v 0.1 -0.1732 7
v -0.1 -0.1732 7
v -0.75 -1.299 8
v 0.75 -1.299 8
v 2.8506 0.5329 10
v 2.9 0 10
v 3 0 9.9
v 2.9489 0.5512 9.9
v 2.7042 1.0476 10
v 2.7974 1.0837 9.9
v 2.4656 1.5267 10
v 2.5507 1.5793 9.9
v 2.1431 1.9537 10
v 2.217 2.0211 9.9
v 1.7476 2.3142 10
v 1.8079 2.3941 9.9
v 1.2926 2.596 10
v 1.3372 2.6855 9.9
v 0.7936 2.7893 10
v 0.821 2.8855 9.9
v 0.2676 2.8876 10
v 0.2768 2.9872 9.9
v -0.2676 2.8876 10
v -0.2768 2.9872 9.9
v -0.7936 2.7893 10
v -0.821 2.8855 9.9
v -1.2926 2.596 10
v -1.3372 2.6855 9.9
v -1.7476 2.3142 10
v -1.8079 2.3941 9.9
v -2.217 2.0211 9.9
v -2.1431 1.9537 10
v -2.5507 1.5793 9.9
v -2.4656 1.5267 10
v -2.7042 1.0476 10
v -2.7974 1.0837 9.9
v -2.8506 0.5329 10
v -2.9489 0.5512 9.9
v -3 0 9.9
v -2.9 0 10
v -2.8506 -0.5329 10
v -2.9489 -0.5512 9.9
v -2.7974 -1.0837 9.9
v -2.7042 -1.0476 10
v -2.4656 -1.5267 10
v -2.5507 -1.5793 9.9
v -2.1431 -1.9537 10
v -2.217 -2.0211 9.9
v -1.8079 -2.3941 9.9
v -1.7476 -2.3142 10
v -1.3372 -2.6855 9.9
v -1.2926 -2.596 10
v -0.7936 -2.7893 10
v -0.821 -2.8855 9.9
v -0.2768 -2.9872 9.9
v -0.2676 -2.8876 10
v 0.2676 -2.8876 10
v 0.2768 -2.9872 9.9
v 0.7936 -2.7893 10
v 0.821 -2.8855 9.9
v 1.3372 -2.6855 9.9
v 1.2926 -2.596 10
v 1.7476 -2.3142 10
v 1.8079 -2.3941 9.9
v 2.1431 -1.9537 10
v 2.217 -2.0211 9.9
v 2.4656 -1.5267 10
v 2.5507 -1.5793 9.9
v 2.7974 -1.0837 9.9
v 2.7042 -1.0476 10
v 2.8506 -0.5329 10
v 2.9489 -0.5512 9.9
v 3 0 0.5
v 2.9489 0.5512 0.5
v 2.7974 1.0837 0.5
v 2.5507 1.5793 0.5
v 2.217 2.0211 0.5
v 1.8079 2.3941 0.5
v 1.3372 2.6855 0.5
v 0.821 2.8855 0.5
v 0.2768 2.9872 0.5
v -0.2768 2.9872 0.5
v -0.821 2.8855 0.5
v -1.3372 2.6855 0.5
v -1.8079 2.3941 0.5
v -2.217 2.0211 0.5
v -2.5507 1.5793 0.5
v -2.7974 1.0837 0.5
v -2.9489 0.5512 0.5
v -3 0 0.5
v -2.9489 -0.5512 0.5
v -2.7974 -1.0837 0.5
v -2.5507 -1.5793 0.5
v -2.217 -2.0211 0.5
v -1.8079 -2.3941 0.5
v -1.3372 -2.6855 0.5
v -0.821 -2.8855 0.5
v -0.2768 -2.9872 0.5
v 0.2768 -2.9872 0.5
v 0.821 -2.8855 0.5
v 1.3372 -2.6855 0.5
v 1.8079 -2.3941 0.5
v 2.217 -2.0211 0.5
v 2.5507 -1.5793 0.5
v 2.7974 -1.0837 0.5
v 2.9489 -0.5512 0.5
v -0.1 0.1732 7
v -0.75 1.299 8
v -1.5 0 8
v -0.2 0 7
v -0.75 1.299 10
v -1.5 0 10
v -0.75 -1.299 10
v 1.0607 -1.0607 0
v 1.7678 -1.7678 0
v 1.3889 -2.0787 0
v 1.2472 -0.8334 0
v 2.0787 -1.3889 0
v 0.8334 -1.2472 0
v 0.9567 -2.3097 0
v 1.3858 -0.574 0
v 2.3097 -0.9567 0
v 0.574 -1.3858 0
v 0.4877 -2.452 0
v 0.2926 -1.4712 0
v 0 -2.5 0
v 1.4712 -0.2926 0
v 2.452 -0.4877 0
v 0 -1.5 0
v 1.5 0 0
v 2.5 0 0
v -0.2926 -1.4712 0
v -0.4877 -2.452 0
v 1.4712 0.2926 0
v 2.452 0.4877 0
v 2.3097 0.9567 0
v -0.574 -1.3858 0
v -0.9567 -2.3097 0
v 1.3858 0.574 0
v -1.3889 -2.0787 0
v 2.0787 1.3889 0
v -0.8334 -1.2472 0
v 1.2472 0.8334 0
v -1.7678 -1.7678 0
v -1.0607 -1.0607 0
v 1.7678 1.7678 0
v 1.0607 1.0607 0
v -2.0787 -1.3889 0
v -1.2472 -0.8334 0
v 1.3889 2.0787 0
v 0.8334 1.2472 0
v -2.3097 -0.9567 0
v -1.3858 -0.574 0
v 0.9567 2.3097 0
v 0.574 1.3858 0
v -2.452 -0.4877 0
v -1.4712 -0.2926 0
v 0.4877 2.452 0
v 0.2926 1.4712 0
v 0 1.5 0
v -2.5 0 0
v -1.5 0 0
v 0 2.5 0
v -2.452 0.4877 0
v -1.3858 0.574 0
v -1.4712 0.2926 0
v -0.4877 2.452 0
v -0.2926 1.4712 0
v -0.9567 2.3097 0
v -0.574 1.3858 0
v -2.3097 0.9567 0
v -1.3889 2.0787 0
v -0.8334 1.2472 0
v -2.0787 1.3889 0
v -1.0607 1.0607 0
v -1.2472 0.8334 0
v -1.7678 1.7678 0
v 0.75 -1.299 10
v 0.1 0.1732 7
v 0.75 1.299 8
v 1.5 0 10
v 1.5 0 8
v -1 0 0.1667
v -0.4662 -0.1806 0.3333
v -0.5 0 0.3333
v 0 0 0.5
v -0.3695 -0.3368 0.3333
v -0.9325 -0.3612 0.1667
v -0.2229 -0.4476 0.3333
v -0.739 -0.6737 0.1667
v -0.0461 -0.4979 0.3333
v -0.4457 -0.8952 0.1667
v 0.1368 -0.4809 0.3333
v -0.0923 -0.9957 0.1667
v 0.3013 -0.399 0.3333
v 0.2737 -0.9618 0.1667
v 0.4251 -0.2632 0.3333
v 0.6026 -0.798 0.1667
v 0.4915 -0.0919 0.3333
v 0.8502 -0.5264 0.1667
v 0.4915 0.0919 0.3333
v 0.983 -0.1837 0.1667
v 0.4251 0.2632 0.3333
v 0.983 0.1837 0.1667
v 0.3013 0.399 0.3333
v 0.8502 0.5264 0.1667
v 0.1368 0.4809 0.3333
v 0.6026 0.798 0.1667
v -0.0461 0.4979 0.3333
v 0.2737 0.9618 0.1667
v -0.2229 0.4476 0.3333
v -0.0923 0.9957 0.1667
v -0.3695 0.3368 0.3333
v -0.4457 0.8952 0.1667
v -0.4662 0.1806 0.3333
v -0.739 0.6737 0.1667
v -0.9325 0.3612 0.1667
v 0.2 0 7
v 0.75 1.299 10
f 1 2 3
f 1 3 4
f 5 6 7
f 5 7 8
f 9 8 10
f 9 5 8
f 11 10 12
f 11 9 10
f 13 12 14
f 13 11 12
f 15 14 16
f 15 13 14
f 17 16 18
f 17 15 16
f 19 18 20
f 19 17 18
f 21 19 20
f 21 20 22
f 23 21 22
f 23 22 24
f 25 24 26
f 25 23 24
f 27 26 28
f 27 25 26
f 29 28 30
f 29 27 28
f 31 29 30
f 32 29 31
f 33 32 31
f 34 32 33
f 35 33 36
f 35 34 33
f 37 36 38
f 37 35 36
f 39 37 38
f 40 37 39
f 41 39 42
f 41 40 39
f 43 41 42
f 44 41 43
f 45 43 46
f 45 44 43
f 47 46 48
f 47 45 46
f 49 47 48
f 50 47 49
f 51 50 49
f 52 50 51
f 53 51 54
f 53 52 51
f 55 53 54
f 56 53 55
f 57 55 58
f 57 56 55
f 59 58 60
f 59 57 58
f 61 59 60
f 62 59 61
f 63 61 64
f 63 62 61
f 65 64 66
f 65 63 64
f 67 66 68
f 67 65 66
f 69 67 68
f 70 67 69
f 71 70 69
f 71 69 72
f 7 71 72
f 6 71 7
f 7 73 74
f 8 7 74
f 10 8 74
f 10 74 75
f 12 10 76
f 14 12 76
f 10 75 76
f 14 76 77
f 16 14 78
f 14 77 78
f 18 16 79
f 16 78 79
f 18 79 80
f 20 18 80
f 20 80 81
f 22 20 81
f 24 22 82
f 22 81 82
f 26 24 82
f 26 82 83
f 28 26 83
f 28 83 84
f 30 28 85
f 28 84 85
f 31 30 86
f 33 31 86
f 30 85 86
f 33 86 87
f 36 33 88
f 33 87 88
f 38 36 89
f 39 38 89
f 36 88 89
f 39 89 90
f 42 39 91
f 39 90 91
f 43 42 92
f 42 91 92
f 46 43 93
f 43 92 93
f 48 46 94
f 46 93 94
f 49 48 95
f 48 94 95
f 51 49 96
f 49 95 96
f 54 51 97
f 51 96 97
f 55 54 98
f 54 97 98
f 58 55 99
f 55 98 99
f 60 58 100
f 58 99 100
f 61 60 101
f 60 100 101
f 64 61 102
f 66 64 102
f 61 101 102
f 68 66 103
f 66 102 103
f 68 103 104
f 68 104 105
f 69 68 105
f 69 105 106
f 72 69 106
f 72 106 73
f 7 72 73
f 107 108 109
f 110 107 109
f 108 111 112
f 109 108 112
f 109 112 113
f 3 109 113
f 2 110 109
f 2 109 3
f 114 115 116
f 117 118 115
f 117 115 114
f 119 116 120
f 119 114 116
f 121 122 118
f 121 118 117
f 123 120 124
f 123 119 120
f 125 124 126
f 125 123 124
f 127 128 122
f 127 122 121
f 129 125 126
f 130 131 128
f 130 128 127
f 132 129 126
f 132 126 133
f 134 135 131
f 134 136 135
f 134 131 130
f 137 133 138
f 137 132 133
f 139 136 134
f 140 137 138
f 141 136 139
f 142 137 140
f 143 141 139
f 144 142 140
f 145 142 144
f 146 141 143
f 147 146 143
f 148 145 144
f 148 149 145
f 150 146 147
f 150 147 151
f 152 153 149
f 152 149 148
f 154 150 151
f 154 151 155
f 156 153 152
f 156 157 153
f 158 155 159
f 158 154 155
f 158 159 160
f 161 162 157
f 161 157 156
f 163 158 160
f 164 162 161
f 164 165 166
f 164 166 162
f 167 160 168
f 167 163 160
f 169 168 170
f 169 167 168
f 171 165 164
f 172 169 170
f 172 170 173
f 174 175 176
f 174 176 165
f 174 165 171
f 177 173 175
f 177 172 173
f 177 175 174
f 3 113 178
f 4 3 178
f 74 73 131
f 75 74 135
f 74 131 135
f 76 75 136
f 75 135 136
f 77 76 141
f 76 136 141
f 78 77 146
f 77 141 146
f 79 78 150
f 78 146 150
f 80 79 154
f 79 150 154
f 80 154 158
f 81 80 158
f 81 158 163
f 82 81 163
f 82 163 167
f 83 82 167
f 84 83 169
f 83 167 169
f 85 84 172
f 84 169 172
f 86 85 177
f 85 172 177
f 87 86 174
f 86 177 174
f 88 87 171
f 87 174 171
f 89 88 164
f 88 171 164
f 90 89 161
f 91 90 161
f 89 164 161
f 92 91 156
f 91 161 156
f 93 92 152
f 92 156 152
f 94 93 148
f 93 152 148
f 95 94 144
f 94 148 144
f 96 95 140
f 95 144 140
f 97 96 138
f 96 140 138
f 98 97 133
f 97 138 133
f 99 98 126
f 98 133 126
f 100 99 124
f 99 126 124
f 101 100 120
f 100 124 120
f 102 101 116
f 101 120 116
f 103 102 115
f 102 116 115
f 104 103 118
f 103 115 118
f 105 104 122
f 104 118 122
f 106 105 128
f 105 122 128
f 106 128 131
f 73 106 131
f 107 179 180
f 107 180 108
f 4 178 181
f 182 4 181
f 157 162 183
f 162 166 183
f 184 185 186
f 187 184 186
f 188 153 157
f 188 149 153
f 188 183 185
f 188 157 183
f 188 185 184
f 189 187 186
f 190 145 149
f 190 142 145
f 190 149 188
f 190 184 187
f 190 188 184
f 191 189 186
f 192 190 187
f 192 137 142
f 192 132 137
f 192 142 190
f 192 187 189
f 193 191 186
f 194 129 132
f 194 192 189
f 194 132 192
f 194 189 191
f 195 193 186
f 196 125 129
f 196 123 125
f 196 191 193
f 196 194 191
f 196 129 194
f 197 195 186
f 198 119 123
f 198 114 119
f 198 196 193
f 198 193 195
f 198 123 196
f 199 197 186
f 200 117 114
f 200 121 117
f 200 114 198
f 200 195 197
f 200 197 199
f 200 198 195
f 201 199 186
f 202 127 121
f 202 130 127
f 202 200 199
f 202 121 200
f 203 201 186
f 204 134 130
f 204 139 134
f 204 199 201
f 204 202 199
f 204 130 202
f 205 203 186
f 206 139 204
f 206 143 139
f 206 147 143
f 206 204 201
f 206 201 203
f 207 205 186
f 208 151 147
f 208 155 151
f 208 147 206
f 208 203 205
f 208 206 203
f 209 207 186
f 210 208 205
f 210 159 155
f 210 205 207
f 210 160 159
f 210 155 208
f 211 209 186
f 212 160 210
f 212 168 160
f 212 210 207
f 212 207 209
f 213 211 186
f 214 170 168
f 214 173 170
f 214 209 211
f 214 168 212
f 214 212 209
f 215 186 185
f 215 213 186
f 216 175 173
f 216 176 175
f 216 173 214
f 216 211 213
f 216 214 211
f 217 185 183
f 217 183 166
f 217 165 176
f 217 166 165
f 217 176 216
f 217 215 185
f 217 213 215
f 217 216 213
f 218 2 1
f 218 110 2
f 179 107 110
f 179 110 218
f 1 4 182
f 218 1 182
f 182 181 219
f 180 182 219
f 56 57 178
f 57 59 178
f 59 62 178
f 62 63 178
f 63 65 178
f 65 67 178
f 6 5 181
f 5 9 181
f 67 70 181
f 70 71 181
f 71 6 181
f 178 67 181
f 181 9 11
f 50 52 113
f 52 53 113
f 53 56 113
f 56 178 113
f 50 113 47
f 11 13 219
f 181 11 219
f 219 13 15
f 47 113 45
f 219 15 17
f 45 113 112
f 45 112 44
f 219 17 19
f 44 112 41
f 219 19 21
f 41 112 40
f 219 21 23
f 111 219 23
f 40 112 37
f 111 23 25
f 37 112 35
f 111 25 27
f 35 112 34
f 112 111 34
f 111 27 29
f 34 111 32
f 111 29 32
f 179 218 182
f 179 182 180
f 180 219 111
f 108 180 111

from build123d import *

# Parameters (mm, degrees)
SKETCH_1_W          = 3
SKETCH_1_H          = 10
CUT_EXTRUDE_1_DEPTH = 3
CHAMFER_1_SIZE      = 0.100000121
CHAMFER_1_SIZE2     = 0.100000075
CHAMFER_2_SIZE      = 1.125833025
CHAMFER_2_SIZE2     = 1
CHAMFER_3_SIZE      = 0.500000325
CHAMFER_3_SIZE2     = 0.500000243


with BuildPart() as part:
    # 草图1 → 旋转1 (revolve)
    with BuildSketch(Plane(origin=(0, 0, 0), x_dir=(1, 0, 0), z_dir=(0, 1, 0))):
        with Locations((1.5, -5)):
            Rectangle(SKETCH_1_W, SKETCH_1_H)
    revolve(axis=Axis((0, 0, 0), (0, 0, 1)))

    # 草图2 → 切除-拉伸1 (cut)
    with BuildSketch(Plane.XY.offset(10)):
        Polygon((0.75, -1.299038106), (1.5, 0), (0.75, 1.299038106), (-0.75, 1.299038106), (-1.5, 0), (-0.75, -1.299038106), align=None)
    extrude(amount=-CUT_EXTRUDE_1_DEPTH, mode=Mode.SUBTRACT)

    # 草图3 → 切除-旋转1 (revolve, cut)
    with BuildSketch(Plane(origin=(0, 0, 0), x_dir=(1, 0, 0), z_dir=(0, 1, 0)), mode=Mode.PRIVATE) as cut_revolve_1_sk:
        Polygon((1.499999, 0), (0, 0), (0, -0.500000312), align=None)
    revolve(cut_revolve_1_sk.sketch.rotate(Axis((0, 0, -2.5e-05), (0, 0, 1)), 180), axis=Axis((0, 0, -2.5e-05), (0, 0, 1)), mode=Mode.SUBTRACT)

    # 倒角1
    chamfer_1_edges = [part.edges().sort_by_distance(p)[0] for p in [
        (-3, 0, 10),
    ]]
    chamfer_1_side = [part.faces().sort_by_distance(p)[0] for p in [
        (-3, 0, 5),
    ]]
    chamfer(chamfer_1_edges, length=CHAMFER_1_SIZE, length2=CHAMFER_1_SIZE2, reference=chamfer_1_side[0])

    # 倒角2
    chamfer_2_edges = [part.edges().sort_by_distance(p)[0] for p in [
        (0, -1.299038106, 7),
        (-1.125, -0.649519053, 7),
        (-1.125, 0.649519053, 7),
        (0, 1.299038106, 7),
        (1.125, 0.649519053, 7),
        (1.125, -0.649519053, 7),
    ]]
    chamfer_2_side = [part.faces().sort_by_distance(p)[0] for p in [
        (0, 0, 7),
    ]]
    chamfer(chamfer_2_edges, length=CHAMFER_2_SIZE, length2=CHAMFER_2_SIZE2, reference=chamfer_2_side[0])

    # 倒角3
    chamfer_3_edges = [part.edges().sort_by_distance(p)[0] for p in [
        (-3, 0, 0),
    ]]
    chamfer_3_side = [part.faces().sort_by_distance(p)[0] for p in [
        (-3, 0, 4.94999994),
    ]]
    chamfer(chamfer_3_edges, length=CHAMFER_3_SIZE, length2=CHAMFER_3_SIZE2, reference=chamfer_3_side[0])


solid = part.part
